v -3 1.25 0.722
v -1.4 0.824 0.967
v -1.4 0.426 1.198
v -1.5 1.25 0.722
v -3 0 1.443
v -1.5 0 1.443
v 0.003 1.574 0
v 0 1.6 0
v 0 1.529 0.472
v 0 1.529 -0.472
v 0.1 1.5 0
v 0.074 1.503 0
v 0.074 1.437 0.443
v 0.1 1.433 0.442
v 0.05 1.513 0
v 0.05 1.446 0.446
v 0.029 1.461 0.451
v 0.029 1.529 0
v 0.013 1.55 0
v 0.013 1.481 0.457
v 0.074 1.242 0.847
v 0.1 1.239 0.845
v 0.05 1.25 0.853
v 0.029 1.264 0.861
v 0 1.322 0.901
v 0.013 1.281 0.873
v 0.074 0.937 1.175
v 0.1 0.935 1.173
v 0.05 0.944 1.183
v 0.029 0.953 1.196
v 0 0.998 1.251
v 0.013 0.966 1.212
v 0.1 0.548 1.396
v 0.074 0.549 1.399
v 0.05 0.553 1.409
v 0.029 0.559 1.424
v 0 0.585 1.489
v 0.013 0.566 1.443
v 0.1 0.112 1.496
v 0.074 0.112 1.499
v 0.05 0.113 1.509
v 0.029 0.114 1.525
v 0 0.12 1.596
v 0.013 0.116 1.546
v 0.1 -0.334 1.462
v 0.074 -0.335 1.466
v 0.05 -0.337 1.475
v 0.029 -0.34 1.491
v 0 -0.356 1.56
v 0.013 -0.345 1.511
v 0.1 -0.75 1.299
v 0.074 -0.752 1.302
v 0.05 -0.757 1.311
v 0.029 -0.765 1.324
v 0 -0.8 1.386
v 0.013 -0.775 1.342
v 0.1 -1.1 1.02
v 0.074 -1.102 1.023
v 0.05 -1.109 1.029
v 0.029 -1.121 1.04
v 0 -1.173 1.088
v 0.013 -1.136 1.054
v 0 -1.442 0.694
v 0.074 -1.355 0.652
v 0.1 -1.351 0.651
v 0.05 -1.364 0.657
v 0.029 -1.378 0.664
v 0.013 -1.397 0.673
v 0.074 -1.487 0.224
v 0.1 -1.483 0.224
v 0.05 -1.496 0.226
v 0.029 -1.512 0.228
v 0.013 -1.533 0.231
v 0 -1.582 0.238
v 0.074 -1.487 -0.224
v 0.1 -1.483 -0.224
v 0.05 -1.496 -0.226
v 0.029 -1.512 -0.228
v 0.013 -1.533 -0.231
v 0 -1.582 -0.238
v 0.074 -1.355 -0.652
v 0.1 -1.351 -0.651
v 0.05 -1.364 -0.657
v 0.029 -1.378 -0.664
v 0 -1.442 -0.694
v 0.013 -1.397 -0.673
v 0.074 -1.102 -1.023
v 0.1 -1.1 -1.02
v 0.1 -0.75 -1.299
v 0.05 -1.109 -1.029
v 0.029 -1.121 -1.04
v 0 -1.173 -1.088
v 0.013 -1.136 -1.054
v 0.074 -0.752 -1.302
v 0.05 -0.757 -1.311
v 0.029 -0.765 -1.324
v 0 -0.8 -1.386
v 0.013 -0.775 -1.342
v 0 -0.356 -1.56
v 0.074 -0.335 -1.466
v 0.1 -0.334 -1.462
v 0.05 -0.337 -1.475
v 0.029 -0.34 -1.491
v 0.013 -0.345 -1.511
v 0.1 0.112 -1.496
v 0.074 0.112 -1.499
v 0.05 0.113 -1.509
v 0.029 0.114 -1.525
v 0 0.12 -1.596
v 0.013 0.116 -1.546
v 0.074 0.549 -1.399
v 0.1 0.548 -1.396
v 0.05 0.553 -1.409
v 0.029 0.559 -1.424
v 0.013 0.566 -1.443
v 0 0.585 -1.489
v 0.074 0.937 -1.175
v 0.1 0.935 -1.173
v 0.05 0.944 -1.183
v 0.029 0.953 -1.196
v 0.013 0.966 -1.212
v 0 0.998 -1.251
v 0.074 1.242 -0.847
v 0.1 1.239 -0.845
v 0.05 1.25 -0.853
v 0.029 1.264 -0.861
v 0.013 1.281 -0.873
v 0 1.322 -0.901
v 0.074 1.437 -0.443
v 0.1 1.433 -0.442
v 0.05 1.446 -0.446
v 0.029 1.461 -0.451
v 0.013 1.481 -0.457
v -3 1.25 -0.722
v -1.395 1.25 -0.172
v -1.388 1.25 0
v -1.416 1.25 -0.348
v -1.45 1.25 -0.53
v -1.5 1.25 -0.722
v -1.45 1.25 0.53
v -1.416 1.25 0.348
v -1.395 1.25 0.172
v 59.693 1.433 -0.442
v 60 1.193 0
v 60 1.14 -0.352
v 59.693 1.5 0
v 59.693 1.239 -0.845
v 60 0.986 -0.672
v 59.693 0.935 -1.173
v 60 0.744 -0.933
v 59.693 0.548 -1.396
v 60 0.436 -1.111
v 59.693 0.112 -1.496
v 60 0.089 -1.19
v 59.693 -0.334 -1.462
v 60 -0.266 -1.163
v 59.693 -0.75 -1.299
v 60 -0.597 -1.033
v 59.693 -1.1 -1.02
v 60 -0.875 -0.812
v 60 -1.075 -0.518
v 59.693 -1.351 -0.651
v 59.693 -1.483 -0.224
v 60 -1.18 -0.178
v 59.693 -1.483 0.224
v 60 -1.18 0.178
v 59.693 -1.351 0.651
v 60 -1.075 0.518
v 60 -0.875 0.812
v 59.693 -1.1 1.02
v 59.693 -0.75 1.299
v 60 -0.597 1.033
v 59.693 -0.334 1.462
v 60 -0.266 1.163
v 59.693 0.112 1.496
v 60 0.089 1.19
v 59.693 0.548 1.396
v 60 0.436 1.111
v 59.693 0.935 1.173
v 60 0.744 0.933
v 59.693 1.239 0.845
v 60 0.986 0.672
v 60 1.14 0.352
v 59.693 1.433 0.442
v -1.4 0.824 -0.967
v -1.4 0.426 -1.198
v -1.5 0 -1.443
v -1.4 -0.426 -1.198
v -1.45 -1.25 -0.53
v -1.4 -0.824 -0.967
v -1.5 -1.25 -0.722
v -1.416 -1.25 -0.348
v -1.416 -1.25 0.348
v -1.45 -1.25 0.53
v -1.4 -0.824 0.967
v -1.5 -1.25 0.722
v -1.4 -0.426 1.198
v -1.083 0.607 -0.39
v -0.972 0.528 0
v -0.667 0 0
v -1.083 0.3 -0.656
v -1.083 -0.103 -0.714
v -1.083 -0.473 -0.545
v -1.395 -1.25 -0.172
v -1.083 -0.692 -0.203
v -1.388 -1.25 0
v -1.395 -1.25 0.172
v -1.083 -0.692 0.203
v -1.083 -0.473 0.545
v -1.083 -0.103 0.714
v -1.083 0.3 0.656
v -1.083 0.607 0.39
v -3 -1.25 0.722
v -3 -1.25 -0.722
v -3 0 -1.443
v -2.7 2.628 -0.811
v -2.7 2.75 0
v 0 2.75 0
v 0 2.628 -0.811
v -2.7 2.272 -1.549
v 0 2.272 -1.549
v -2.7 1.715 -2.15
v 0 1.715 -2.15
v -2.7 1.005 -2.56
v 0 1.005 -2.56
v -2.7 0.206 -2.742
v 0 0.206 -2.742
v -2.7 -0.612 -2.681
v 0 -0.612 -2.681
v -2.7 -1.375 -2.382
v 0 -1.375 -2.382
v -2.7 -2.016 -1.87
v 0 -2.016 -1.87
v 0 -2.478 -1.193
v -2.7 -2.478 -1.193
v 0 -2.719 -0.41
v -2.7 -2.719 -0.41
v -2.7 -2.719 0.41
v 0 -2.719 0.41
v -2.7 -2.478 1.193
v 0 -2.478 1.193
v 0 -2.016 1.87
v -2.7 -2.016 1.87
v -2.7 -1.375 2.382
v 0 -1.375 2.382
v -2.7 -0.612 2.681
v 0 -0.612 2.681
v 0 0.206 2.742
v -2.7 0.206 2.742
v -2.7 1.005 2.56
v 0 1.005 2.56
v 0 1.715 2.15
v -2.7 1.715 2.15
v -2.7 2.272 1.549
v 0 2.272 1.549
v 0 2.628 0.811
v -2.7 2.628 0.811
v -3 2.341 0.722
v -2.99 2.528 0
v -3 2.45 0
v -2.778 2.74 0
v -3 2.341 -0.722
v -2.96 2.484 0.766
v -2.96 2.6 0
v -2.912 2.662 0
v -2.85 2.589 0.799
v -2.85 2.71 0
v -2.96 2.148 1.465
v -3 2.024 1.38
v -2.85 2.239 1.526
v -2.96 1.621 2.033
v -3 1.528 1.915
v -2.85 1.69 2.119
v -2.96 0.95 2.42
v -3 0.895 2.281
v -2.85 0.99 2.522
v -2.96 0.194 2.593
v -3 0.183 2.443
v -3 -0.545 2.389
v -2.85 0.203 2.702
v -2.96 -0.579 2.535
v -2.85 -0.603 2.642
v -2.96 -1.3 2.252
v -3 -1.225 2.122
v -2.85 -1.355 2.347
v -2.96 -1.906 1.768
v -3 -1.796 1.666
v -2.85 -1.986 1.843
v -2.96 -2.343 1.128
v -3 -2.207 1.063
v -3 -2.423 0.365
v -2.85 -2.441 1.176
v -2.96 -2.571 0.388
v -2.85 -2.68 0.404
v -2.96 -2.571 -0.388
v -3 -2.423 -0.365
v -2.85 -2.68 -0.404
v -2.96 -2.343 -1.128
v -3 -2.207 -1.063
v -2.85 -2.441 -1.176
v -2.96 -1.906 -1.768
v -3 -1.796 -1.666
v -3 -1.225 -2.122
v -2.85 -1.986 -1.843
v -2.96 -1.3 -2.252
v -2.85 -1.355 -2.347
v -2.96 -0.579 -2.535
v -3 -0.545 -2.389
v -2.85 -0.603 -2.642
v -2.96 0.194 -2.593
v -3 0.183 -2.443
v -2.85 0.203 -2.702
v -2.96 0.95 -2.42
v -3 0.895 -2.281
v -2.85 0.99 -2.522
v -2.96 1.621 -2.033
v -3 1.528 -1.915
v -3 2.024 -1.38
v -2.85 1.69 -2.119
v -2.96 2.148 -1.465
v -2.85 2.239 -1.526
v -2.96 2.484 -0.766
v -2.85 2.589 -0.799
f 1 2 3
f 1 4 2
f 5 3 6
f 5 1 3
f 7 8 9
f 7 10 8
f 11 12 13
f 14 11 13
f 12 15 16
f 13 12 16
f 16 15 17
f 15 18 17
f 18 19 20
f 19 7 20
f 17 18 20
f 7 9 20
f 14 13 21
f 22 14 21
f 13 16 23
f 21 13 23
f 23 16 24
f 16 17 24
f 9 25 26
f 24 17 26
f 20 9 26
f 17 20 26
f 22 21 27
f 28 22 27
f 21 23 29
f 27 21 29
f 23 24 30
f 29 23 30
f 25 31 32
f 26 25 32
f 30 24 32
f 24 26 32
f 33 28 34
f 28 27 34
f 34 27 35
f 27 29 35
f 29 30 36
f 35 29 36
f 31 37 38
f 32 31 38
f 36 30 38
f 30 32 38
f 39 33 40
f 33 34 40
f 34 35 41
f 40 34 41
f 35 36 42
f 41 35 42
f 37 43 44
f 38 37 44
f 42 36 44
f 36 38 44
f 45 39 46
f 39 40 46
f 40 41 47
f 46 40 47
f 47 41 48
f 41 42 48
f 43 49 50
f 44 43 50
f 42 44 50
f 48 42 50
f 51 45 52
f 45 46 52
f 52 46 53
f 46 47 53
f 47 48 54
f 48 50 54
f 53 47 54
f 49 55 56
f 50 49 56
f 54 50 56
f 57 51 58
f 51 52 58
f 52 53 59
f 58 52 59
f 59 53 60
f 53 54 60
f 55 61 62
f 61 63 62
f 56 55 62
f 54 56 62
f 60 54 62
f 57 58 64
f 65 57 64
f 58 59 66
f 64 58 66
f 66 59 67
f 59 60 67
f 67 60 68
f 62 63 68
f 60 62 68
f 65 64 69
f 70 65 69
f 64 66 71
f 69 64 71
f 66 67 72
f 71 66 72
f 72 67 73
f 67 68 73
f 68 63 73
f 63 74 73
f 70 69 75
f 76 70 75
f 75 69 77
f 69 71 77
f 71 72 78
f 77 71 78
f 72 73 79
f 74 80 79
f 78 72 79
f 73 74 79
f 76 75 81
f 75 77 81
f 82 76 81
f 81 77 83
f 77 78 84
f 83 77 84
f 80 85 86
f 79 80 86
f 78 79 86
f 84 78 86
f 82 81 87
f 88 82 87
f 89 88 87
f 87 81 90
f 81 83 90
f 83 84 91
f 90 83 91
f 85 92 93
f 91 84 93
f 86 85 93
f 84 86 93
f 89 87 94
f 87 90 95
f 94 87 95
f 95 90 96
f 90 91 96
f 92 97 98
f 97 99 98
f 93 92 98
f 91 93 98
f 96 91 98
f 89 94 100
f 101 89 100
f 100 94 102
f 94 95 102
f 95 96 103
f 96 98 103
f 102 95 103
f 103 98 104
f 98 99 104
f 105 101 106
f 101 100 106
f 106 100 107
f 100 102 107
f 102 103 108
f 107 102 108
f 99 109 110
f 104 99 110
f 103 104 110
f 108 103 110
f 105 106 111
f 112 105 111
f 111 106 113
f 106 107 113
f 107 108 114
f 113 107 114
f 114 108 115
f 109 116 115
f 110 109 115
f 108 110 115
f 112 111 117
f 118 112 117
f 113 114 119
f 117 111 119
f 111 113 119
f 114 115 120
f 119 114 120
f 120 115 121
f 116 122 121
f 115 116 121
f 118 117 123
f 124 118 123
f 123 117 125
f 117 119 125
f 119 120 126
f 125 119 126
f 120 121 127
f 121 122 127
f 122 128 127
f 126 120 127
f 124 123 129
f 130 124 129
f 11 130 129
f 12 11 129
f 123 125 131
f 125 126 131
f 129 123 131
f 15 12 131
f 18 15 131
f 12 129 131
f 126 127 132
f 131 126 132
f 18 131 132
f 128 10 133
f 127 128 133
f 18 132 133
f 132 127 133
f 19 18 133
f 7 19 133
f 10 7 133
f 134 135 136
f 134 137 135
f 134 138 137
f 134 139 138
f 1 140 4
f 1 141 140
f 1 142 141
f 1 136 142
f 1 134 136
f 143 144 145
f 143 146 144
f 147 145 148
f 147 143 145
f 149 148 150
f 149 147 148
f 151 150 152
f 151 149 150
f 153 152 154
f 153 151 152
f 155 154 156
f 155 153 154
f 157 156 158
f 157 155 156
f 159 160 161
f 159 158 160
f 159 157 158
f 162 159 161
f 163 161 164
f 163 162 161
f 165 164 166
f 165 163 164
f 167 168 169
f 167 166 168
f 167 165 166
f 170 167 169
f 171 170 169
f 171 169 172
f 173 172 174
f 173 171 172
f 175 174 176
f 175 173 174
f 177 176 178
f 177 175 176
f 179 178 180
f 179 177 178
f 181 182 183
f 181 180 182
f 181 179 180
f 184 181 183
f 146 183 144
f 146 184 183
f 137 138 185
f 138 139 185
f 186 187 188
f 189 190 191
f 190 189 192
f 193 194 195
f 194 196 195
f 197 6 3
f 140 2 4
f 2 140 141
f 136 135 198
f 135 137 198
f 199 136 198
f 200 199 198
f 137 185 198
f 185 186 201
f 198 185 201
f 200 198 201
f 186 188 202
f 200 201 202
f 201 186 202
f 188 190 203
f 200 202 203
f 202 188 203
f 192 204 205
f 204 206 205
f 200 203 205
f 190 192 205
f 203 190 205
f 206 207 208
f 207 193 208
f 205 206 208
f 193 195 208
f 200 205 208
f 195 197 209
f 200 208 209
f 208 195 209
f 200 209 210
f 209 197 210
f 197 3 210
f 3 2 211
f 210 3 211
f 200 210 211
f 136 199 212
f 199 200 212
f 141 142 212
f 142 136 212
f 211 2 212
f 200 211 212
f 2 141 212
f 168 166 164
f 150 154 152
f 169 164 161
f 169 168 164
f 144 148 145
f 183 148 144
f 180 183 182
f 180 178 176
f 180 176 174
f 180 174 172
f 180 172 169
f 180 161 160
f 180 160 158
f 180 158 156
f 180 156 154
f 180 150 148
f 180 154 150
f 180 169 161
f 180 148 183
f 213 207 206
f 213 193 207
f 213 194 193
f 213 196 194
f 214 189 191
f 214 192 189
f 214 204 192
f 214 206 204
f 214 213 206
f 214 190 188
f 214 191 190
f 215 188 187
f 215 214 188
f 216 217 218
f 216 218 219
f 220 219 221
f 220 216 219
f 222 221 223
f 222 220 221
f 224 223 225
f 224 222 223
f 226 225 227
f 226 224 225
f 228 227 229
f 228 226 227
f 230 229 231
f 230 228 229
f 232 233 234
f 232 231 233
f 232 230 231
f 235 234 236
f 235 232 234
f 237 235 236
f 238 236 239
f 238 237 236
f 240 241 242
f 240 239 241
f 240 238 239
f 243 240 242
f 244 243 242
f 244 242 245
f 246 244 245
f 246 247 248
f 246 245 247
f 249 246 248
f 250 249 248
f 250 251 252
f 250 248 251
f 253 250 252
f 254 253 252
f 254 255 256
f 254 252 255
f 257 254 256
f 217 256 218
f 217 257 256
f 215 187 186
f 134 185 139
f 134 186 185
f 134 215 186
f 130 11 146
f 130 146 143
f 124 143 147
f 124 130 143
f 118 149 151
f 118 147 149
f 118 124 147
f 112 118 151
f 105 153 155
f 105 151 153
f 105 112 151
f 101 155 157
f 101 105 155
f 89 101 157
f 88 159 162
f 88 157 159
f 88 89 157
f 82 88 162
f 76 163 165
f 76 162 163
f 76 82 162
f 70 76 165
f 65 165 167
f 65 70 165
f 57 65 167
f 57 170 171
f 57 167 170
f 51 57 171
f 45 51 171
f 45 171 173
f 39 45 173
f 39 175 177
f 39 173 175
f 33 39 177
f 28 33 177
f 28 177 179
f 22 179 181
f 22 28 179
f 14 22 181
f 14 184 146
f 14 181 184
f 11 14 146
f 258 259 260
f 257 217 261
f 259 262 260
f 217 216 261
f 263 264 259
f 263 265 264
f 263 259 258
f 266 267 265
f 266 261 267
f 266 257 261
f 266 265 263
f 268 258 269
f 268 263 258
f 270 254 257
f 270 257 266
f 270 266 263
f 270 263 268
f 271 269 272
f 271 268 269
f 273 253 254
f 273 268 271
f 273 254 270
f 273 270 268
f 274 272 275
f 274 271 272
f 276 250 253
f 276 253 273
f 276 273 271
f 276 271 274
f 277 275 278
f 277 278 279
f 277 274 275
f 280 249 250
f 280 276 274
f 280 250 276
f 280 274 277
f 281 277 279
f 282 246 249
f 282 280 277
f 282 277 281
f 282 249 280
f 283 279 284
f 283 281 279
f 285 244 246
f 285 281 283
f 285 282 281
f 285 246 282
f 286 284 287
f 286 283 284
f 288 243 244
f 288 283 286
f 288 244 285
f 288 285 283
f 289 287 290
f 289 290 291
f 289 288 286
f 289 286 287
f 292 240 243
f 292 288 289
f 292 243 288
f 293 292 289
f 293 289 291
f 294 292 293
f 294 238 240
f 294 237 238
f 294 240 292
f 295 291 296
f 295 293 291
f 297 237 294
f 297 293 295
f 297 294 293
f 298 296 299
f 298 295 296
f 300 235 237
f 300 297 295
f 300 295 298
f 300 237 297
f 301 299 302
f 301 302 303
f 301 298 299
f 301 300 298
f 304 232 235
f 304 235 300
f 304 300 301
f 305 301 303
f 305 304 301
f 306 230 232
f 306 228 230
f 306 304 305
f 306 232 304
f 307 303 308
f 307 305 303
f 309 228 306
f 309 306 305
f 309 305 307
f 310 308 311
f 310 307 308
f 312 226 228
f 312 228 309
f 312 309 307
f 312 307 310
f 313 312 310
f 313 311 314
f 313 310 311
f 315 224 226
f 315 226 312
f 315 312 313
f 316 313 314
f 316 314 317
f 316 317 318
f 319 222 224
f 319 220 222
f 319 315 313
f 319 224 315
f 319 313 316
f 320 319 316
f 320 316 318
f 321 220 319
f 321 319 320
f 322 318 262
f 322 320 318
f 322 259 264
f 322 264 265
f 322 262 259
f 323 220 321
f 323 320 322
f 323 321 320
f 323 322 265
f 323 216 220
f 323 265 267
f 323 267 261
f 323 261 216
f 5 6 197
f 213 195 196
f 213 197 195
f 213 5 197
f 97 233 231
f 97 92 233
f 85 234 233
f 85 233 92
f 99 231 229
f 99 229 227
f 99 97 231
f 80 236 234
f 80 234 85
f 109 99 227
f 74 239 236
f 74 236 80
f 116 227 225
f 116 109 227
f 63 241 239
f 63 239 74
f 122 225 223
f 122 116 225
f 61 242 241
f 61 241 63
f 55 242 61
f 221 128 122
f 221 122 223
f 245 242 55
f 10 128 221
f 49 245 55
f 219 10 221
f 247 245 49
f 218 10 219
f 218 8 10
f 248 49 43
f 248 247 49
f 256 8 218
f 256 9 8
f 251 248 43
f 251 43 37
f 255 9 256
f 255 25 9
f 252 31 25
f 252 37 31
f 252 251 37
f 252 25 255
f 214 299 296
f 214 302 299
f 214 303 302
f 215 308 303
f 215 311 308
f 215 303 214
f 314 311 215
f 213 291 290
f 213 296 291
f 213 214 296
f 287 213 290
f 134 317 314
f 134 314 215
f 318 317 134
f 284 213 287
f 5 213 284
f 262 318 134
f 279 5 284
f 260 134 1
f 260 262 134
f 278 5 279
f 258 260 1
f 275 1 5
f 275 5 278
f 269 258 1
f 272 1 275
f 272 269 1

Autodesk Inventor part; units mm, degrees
ref_plane "YZ Plane" through (0, 0, 0) normal (1, 0, 0) x (0, 1, 0)
ref_plane "XZ Plane" through (0, 0, 0) normal (0, 1, 0) x (-1, 0, 0)
sketch "Sketch1" plane through (0, 0, 0) normal (0, 0, 1) x (1, 0, 0)
  line L0 (-0.6667, 0) -> (60, 0)
  line L1 (60, 0) -> (60, 1.5)
  line L2 (60, 1.5) -> (42, 1.5)
  line L3 (42, 1.5) -> (41.6932, 1.5)
  line L4 (41.6932, 1.5) -> (0, 1.5)
  line L5 (0, 1.5) -> (0, 2.75)
  line L6 (0, 2.75) -> (-3, 2.75)
  line L7 (-3, 2.75) -> (-3, 1.4434)
  line L8 (-3, 1.4434) -> (-1.5, 1.4434)
  line L9 (-1.5, 1.4434) -> (-0.6667, 0)
  line L10 (-15.6, 0) -> (72.6, 0) projected
  line L11 (0, -0.55) -> (0, 3.3) projected
  line L12 (42, 1.5) -> (0, 1.5) construction
  dimension "d1" = 18
  dimension "d2" = 0.3068
  dimension "d3" = 3
  dimension "d4" = 1.5
  dimension "d5" = 60
  dimension "d6" = 3
  dimension "d7" = 3
  dimension "d8" = 2.8868
  dimension "d9" = 5.5
  dimension "d26" = 60
revolve "Body" add sketch "Sketch1" angle 360 about axis through (-0.6667, 0, 0) along (1, 0, 0)
sketch "Sketch2" plane through (-3, 0, 0) normal (-1, 0, 0) x (0, 0, 1)
  circle A0 centre (0, 0) radius 1.4434 projected
  line L0 (0, -3.85) -> (0, 3.85) projected
  line L1 (-3.85, 0) -> (3.85, 0) projected
  line L2 (1.4434, 0) -> (0.7217, -1.25)
  line L3 (0.7217, -1.25) -> (-0.7217, -1.25)
  line L4 (-0.7217, -1.25) -> (-1.4434, 0)
  line L5 (-1.4434, 0) -> (-0.7217, 1.25)
  line L6 (-0.7217, 1.25) -> (0.7217, 1.25)
  line L7 (0.7217, 1.25) -> (1.4434, 0)
  point P0 (0, 0)
extrude "Slot" add sketch "Sketch2" against normal up to next contours L7 A0 | A0 L2 | L6 L0 A0 | A0 L0 L3 | L0 L6 A0 | A0 L3 L0 | L4 A0 | A0 L5
fillet "Fillet1" radius 0.3 1 edges at (-3, -2.75, 0)
thread "Thread" size "M3x0.5" class "6g" standard "ISO Metric profile" length 18
chamfer "Chamfer1" distance 0.3067 distance2 0.3067 1 edges at (60, -1.5, 0) measured on face at (60, -0.3743, 0.3316)
ref_plane "Work Plane1" through (29, 0, 0) normal (0, -1, 0) x (1, 0, 0)
fillet "Fillet2" radius 0.1 1 edges at (0, -1.5, 0)
equation "\"d1\" = GEL"
equation "\"d3\" = KOH"
equation "\"d4\" = INTI"
equation "\"d6\" = GD"
equation "\"d7\" = BDM"
equation "\"d8\" = 1.1547 * SW"
equation "\"d9\" = KOD"
equation "\"d26\" = NLG"
equation "\"d30\" = R"
equation "\"d17\" = RR"
equation "\"d13\" = GEL"
equation "\"d15\" = -0.5 * SPD + 0.5 * GD"
equation "\"d16\" = GUL"
equation "\"GD\" = NND"
equation "\"NLG\" = 60"
equation "\"GEL\" = 18"
equation "\"KOD\" = 5.5"
equation "\"KOH\" = 3"
equation "\"INTI\" = 1.5"
equation "\"GAL\" = 0.61345 * PTC"
equation "\"GUL\" = 0.61345 * PTC"
equation "\"BDM\" = NND"
equation "\"SW\" = 2.5"
equation "\"RR\" = 0.3"
equation "\"SPD\" = 2.38655"
equation "\"R\" = 0.1"
equation "\"TOA\" = 30deg"
equation "\"THREADDIA\" = 3"
equation "\"PTC\" = 0.5"
equation "\"NND\" = 3"
equation "\"E0\" = 1.155 * SW"
equation "\"GD1\" = THREADDIA - 1.2269 * PTC"
properties part number "ANSI B18.3.1M - M3x0.5 x 60" material "Steel, Mild"
